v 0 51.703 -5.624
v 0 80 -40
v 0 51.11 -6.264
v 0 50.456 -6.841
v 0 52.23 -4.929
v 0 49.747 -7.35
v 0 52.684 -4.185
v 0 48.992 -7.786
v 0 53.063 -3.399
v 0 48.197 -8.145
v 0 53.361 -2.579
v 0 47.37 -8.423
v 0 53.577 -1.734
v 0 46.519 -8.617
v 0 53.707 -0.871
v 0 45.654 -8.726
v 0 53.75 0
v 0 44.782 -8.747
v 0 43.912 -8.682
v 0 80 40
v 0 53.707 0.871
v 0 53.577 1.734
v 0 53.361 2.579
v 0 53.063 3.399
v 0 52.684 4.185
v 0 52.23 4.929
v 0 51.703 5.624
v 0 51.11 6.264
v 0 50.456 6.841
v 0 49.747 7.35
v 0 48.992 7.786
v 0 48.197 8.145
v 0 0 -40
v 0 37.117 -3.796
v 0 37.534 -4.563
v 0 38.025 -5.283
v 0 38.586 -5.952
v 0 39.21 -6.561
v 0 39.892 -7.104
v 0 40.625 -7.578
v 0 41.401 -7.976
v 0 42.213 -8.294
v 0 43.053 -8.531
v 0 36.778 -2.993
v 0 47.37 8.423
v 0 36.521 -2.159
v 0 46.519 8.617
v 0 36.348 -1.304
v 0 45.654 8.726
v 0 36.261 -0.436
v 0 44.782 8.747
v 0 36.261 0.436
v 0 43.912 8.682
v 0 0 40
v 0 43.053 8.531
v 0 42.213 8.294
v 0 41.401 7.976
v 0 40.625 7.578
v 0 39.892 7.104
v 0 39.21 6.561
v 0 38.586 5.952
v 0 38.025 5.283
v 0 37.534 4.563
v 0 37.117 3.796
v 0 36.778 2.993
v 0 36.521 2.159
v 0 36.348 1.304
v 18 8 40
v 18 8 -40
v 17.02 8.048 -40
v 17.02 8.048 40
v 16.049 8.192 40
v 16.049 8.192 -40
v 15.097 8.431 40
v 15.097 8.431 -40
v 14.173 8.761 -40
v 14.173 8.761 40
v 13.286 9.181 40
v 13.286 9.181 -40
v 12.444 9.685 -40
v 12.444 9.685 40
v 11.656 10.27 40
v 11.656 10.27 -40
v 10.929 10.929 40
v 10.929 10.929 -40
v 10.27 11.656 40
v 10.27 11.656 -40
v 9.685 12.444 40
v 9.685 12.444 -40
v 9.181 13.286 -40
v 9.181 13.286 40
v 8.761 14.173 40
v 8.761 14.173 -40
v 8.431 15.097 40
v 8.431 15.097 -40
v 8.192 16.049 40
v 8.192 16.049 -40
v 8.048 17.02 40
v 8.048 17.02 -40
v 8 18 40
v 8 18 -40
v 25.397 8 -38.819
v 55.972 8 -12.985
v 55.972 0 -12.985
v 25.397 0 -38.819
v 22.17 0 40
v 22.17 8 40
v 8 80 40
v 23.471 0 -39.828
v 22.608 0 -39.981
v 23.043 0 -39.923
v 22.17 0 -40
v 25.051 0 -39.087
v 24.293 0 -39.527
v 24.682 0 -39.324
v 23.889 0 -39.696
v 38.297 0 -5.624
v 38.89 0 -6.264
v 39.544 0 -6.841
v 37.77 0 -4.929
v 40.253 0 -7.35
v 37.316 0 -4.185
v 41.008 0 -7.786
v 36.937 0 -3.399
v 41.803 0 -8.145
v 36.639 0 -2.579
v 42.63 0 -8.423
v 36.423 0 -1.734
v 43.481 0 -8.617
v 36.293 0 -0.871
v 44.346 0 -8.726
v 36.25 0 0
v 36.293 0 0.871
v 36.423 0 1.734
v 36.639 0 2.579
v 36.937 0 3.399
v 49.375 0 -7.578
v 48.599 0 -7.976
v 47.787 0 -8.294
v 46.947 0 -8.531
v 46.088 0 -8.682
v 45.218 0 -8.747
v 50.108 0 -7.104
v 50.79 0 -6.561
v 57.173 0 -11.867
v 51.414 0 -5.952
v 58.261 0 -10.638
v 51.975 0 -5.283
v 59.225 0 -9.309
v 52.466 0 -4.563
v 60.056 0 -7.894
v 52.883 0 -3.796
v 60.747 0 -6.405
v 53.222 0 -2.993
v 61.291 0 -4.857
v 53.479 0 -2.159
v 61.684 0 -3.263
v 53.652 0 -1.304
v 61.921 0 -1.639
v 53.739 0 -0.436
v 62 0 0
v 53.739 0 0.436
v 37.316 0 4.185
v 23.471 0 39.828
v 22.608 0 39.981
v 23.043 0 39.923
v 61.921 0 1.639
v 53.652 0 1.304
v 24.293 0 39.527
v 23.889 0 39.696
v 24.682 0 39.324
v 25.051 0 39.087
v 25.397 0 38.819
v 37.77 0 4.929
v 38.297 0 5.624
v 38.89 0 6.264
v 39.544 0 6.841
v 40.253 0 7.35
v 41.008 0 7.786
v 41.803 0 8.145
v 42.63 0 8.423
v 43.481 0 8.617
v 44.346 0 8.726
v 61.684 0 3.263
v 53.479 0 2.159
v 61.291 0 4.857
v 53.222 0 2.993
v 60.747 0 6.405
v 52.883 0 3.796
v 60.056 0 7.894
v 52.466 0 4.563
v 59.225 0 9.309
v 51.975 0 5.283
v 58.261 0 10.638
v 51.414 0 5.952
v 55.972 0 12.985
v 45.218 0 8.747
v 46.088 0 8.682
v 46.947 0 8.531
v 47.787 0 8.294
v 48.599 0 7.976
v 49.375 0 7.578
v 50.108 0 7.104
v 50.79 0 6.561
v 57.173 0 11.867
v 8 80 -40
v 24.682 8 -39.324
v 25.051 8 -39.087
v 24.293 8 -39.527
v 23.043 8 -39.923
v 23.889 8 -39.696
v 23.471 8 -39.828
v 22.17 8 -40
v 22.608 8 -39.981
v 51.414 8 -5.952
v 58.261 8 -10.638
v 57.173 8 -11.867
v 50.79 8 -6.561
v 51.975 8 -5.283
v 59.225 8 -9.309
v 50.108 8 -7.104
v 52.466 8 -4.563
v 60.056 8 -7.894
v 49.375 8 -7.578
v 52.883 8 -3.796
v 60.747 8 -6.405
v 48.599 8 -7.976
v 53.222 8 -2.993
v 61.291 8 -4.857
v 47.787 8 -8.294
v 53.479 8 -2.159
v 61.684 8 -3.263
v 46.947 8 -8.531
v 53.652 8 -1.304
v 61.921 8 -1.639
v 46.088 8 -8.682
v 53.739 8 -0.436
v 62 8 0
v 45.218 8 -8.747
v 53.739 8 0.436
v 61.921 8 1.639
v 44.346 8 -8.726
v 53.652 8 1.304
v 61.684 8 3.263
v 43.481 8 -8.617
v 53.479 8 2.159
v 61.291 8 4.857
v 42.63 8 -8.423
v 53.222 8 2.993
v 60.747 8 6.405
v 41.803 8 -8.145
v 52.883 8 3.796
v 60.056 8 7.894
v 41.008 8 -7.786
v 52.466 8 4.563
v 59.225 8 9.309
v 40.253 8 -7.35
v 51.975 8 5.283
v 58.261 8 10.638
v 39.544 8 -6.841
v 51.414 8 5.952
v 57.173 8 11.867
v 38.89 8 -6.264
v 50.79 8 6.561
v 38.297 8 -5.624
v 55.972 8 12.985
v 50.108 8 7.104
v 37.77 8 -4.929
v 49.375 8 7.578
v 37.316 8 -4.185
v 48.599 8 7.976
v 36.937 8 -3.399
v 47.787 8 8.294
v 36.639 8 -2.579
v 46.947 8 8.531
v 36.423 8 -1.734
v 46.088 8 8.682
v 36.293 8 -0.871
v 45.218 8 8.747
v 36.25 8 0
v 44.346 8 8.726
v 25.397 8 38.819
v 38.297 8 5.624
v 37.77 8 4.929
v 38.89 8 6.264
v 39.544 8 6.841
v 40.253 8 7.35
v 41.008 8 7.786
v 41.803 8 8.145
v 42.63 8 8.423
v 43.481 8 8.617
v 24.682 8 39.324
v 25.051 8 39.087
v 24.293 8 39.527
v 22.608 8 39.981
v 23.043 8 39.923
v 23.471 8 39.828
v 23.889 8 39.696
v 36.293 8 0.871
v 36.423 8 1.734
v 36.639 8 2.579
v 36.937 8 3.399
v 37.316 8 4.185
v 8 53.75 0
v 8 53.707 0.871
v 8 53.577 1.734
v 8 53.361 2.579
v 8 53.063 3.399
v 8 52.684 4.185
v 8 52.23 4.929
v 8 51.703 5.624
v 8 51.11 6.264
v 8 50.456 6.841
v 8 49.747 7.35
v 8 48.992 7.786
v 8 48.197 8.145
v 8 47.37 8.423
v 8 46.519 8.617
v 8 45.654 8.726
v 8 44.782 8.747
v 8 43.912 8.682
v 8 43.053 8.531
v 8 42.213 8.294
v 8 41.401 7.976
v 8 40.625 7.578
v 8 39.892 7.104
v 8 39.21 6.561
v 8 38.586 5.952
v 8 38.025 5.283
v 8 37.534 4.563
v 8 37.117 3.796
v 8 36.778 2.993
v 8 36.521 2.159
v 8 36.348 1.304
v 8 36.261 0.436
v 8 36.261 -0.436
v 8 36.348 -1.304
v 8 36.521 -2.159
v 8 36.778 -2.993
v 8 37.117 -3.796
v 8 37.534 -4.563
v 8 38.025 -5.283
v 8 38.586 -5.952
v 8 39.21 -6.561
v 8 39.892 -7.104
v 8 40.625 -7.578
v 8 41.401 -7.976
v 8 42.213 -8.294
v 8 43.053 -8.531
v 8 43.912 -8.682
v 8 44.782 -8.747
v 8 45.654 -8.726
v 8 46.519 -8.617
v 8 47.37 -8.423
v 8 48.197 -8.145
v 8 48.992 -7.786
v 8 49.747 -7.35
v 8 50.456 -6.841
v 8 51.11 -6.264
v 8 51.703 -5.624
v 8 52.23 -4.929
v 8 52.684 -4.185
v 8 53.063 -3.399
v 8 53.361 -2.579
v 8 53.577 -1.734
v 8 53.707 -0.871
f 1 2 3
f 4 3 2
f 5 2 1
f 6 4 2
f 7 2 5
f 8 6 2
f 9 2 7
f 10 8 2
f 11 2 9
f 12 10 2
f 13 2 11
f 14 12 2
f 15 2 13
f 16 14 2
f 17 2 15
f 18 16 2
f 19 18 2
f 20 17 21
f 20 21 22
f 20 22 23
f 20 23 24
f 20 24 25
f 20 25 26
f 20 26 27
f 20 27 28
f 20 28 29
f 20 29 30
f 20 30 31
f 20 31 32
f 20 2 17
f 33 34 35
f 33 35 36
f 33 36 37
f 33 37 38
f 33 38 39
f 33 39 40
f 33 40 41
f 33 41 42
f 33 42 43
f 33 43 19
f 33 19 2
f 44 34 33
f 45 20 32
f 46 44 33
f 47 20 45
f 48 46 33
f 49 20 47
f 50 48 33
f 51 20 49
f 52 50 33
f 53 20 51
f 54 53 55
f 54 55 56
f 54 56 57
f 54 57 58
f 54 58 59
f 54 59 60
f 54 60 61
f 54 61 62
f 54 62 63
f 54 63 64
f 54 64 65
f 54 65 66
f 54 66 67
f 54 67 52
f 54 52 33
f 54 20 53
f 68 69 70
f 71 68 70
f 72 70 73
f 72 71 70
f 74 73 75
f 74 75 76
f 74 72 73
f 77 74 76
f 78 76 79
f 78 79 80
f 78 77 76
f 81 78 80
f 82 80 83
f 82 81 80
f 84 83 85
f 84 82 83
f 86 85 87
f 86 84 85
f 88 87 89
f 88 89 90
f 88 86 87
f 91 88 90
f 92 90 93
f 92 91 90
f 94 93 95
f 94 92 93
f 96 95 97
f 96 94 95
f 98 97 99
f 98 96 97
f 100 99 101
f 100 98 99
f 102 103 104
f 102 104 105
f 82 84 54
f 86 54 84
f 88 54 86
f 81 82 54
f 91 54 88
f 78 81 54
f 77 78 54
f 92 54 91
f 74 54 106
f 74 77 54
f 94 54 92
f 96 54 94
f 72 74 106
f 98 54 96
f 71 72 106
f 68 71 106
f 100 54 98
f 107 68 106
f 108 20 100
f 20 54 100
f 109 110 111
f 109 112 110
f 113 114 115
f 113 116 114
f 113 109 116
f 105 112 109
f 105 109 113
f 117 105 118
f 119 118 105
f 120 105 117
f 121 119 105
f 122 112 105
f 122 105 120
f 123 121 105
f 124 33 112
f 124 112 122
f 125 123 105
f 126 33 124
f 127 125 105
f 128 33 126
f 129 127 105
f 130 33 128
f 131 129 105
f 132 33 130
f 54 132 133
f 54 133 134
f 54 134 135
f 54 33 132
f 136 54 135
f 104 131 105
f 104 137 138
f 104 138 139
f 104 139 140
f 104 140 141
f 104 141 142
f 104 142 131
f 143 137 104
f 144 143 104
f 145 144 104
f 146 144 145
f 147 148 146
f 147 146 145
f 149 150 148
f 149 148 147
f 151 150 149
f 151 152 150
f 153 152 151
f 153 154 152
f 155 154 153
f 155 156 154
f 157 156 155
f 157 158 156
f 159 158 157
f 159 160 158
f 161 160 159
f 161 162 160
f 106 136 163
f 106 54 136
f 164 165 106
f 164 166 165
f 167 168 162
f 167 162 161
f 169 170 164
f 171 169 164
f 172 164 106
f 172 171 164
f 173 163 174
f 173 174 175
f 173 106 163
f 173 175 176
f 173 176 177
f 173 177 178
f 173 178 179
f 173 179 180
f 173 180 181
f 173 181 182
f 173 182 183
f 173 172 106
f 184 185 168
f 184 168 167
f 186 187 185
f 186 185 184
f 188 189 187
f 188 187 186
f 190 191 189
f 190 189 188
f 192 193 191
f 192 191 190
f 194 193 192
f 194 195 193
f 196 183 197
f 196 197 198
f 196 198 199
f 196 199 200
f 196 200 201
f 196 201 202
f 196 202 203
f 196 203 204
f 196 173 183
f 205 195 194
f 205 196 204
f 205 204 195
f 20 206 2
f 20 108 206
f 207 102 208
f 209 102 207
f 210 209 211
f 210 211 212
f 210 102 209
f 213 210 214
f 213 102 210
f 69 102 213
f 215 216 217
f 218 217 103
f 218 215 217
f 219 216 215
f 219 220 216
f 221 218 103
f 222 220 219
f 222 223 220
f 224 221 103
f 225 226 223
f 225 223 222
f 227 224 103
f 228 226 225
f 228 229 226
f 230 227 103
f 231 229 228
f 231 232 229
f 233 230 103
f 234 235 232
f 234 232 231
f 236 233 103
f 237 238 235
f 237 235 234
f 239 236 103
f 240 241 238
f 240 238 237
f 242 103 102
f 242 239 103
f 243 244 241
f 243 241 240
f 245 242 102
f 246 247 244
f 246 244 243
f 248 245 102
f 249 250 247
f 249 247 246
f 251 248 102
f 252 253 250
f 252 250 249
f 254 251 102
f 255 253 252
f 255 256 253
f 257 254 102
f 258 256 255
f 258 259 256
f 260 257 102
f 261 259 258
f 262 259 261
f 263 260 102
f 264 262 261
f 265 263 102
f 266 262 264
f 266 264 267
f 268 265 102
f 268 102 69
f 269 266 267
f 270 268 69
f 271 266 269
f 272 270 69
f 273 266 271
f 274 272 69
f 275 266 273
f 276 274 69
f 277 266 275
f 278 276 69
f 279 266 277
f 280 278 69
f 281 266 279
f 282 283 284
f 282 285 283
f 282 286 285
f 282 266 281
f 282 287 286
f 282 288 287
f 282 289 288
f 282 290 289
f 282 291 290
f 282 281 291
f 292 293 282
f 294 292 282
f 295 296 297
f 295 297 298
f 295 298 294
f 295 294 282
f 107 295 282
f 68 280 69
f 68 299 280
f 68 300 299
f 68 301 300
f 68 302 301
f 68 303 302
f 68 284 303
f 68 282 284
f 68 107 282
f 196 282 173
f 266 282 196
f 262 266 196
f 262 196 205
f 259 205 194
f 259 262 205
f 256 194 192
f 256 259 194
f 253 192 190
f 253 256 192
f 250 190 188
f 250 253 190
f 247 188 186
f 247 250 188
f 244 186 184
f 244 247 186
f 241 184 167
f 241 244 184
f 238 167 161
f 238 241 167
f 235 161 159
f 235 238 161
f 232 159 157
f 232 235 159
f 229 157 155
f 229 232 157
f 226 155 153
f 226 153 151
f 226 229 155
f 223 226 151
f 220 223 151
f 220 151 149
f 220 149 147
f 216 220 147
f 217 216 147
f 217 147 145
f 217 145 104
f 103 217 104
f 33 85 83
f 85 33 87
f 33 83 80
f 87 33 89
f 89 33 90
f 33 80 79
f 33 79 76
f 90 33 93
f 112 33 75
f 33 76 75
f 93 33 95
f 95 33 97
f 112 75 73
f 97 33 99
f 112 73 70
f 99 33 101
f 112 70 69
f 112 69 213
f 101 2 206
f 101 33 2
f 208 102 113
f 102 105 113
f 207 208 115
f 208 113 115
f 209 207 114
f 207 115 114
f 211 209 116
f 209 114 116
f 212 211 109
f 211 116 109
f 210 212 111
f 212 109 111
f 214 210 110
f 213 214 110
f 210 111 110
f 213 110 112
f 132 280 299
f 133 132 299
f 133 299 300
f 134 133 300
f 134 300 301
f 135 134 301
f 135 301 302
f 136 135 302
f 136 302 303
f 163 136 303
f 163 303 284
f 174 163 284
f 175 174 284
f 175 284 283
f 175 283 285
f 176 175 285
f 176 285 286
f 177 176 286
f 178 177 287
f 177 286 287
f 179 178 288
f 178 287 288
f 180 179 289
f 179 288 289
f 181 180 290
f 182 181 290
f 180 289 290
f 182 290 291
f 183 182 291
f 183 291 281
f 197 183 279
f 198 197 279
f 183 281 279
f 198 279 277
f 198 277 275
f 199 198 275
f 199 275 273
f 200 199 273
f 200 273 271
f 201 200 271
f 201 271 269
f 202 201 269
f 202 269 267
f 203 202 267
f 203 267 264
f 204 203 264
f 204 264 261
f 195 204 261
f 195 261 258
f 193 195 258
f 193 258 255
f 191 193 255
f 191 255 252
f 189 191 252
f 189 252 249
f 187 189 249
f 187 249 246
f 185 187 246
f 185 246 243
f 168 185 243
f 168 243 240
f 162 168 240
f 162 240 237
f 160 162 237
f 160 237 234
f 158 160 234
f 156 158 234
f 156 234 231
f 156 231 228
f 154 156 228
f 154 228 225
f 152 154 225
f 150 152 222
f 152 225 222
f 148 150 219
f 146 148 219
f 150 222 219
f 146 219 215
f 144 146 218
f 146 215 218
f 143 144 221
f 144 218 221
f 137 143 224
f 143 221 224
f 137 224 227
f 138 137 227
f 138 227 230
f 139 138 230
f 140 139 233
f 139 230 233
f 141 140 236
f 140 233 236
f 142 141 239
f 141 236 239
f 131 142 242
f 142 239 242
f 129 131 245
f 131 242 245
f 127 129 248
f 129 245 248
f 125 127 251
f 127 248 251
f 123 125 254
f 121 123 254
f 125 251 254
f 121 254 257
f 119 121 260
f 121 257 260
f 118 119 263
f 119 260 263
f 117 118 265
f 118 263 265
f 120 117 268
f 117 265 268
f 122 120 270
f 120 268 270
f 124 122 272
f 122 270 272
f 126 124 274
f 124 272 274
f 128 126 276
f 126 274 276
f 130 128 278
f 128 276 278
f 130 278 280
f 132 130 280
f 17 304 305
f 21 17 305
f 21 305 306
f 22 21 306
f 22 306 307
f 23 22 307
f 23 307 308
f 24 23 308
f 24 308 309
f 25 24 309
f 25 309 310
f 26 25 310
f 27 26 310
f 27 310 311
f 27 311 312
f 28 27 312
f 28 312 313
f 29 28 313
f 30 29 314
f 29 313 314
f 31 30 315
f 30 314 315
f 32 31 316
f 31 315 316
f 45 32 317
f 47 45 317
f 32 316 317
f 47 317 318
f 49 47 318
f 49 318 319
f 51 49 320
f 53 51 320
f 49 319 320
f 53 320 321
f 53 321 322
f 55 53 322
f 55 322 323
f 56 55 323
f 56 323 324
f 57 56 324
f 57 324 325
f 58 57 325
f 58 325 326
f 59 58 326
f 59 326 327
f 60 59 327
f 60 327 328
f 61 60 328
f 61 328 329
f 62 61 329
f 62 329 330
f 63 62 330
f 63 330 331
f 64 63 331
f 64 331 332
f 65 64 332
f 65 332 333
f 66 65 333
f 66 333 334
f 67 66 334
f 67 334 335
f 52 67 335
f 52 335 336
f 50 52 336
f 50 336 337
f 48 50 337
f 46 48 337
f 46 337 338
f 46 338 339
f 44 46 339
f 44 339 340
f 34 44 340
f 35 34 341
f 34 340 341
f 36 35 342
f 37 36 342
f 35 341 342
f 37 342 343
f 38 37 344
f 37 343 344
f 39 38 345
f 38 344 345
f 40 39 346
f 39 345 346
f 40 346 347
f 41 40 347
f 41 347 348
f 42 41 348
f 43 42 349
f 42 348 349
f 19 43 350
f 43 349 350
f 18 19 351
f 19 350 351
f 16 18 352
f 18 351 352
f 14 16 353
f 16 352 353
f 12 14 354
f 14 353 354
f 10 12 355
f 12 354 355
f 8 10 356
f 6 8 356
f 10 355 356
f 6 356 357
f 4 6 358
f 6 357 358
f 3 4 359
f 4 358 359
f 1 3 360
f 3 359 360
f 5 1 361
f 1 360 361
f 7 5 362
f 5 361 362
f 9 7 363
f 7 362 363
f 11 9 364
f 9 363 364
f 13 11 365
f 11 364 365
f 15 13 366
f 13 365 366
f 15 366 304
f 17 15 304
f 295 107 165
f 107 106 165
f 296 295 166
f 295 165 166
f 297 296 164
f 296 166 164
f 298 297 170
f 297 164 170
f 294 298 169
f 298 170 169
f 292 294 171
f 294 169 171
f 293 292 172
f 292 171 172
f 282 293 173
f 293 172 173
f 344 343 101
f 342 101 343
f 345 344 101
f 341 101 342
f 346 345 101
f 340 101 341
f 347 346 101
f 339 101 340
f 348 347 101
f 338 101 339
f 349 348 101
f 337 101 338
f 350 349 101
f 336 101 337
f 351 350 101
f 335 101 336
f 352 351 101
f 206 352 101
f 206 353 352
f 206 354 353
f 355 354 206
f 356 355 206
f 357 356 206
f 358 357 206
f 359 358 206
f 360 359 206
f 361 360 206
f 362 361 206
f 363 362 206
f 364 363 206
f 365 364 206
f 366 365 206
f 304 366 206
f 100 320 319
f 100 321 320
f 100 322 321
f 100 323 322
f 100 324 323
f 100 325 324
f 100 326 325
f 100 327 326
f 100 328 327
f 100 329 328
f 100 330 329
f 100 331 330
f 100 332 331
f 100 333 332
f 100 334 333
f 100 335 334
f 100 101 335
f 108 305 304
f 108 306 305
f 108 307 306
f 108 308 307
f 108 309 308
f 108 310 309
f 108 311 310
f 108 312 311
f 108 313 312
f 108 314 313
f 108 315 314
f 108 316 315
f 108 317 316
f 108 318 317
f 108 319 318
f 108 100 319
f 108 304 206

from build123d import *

# Parameters (mm, degrees)
AUFSATZ_AUFTRAGEN_MAIN_BODY_DEPTH = 40
SKIZZE3_R                         = 8.75
BOHRUNG_HORIZONTAL_DEPTH          = 115.821600755
SKIZZE4_R                         = 8.75
BOHRUNG_VERTIKAL_DEPTH            = 115.821600755
LINEAR_AUSTRAGEN_DEPTH            = 115.821600755
VERRUNDUNG_R                      = 5


with BuildPart() as part:
    # Skizze1 → Aufsatz Auftragen Main Body (new, symmetric)
    with BuildSketch(Plane.XY):
        with BuildLine():
            Line((0, 0), (80, 0))
            Line((80, 0), (80, 8))
            Line((80, 8), (18, 8))
            ThreePointArc((18, 8), (10.928932188, 10.928932188), (8, 18))
            Line((8, 18), (8, 80))
            Line((8, 80), (0, 80))
            Line((0, 80), (0, 0))
        make_face()
    extrude(amount=AUFSATZ_AUFTRAGEN_MAIN_BODY_DEPTH, both=True)

    # Skizze3 → Bohrung Horizontal (cut, through all)
    with BuildSketch(Plane(origin=(0, 8, 0), x_dir=(1, 0, 0), z_dir=(0, 1, 0))):
        with Locations(Location((45, 0, 0), (0, 0, 180))):
            Circle(SKIZZE3_R)
    extrude(amount=-BOHRUNG_HORIZONTAL_DEPTH, mode=Mode.SUBTRACT)

    # Skizze4 → Bohrung Vertikal (cut, through all)
    with BuildSketch(Plane(origin=(8, 0, 0), x_dir=(0, 0, -1), z_dir=(1, 0, 0))):
        with Locations(Location((0, 45, 0), (0, 0, 90))):
            Circle(SKIZZE4_R)
    extrude(amount=-BOHRUNG_VERTIKAL_DEPTH, mode=Mode.SUBTRACT)

    # Skizze5 → Linear Austragen (cut, through all)
    with BuildSketch(Plane(origin=(0, 8, 0), x_dir=(1, 0, 0), z_dir=(0, 1, 0))):
        with BuildLine():
            Line((24, -40), (55.971921298, -12.985258682))
            ThreePointArc((55.971921298, -12.985258682), (62, 0), (55.971921298, 12.985258682))
            Line((55.971921298, 12.985258682), (24, 40))
            Line((24, 40), (80, 40))
            Line((80, 40), (80, -40))
            Line((80, -40), (24, -40))
        make_face()
    extrude(amount=-LINEAR_AUSTRAGEN_DEPTH, mode=Mode.SUBTRACT)

    # Verrundung
    verrundung_edges = [part.edges().sort_by_distance(p)[0] for p in [
        (24, 4, 40),
        (24, 4, -40),
    ]]
    fillet(verrundung_edges, radius=VERRUNDUNG_R)


solid = part.part
